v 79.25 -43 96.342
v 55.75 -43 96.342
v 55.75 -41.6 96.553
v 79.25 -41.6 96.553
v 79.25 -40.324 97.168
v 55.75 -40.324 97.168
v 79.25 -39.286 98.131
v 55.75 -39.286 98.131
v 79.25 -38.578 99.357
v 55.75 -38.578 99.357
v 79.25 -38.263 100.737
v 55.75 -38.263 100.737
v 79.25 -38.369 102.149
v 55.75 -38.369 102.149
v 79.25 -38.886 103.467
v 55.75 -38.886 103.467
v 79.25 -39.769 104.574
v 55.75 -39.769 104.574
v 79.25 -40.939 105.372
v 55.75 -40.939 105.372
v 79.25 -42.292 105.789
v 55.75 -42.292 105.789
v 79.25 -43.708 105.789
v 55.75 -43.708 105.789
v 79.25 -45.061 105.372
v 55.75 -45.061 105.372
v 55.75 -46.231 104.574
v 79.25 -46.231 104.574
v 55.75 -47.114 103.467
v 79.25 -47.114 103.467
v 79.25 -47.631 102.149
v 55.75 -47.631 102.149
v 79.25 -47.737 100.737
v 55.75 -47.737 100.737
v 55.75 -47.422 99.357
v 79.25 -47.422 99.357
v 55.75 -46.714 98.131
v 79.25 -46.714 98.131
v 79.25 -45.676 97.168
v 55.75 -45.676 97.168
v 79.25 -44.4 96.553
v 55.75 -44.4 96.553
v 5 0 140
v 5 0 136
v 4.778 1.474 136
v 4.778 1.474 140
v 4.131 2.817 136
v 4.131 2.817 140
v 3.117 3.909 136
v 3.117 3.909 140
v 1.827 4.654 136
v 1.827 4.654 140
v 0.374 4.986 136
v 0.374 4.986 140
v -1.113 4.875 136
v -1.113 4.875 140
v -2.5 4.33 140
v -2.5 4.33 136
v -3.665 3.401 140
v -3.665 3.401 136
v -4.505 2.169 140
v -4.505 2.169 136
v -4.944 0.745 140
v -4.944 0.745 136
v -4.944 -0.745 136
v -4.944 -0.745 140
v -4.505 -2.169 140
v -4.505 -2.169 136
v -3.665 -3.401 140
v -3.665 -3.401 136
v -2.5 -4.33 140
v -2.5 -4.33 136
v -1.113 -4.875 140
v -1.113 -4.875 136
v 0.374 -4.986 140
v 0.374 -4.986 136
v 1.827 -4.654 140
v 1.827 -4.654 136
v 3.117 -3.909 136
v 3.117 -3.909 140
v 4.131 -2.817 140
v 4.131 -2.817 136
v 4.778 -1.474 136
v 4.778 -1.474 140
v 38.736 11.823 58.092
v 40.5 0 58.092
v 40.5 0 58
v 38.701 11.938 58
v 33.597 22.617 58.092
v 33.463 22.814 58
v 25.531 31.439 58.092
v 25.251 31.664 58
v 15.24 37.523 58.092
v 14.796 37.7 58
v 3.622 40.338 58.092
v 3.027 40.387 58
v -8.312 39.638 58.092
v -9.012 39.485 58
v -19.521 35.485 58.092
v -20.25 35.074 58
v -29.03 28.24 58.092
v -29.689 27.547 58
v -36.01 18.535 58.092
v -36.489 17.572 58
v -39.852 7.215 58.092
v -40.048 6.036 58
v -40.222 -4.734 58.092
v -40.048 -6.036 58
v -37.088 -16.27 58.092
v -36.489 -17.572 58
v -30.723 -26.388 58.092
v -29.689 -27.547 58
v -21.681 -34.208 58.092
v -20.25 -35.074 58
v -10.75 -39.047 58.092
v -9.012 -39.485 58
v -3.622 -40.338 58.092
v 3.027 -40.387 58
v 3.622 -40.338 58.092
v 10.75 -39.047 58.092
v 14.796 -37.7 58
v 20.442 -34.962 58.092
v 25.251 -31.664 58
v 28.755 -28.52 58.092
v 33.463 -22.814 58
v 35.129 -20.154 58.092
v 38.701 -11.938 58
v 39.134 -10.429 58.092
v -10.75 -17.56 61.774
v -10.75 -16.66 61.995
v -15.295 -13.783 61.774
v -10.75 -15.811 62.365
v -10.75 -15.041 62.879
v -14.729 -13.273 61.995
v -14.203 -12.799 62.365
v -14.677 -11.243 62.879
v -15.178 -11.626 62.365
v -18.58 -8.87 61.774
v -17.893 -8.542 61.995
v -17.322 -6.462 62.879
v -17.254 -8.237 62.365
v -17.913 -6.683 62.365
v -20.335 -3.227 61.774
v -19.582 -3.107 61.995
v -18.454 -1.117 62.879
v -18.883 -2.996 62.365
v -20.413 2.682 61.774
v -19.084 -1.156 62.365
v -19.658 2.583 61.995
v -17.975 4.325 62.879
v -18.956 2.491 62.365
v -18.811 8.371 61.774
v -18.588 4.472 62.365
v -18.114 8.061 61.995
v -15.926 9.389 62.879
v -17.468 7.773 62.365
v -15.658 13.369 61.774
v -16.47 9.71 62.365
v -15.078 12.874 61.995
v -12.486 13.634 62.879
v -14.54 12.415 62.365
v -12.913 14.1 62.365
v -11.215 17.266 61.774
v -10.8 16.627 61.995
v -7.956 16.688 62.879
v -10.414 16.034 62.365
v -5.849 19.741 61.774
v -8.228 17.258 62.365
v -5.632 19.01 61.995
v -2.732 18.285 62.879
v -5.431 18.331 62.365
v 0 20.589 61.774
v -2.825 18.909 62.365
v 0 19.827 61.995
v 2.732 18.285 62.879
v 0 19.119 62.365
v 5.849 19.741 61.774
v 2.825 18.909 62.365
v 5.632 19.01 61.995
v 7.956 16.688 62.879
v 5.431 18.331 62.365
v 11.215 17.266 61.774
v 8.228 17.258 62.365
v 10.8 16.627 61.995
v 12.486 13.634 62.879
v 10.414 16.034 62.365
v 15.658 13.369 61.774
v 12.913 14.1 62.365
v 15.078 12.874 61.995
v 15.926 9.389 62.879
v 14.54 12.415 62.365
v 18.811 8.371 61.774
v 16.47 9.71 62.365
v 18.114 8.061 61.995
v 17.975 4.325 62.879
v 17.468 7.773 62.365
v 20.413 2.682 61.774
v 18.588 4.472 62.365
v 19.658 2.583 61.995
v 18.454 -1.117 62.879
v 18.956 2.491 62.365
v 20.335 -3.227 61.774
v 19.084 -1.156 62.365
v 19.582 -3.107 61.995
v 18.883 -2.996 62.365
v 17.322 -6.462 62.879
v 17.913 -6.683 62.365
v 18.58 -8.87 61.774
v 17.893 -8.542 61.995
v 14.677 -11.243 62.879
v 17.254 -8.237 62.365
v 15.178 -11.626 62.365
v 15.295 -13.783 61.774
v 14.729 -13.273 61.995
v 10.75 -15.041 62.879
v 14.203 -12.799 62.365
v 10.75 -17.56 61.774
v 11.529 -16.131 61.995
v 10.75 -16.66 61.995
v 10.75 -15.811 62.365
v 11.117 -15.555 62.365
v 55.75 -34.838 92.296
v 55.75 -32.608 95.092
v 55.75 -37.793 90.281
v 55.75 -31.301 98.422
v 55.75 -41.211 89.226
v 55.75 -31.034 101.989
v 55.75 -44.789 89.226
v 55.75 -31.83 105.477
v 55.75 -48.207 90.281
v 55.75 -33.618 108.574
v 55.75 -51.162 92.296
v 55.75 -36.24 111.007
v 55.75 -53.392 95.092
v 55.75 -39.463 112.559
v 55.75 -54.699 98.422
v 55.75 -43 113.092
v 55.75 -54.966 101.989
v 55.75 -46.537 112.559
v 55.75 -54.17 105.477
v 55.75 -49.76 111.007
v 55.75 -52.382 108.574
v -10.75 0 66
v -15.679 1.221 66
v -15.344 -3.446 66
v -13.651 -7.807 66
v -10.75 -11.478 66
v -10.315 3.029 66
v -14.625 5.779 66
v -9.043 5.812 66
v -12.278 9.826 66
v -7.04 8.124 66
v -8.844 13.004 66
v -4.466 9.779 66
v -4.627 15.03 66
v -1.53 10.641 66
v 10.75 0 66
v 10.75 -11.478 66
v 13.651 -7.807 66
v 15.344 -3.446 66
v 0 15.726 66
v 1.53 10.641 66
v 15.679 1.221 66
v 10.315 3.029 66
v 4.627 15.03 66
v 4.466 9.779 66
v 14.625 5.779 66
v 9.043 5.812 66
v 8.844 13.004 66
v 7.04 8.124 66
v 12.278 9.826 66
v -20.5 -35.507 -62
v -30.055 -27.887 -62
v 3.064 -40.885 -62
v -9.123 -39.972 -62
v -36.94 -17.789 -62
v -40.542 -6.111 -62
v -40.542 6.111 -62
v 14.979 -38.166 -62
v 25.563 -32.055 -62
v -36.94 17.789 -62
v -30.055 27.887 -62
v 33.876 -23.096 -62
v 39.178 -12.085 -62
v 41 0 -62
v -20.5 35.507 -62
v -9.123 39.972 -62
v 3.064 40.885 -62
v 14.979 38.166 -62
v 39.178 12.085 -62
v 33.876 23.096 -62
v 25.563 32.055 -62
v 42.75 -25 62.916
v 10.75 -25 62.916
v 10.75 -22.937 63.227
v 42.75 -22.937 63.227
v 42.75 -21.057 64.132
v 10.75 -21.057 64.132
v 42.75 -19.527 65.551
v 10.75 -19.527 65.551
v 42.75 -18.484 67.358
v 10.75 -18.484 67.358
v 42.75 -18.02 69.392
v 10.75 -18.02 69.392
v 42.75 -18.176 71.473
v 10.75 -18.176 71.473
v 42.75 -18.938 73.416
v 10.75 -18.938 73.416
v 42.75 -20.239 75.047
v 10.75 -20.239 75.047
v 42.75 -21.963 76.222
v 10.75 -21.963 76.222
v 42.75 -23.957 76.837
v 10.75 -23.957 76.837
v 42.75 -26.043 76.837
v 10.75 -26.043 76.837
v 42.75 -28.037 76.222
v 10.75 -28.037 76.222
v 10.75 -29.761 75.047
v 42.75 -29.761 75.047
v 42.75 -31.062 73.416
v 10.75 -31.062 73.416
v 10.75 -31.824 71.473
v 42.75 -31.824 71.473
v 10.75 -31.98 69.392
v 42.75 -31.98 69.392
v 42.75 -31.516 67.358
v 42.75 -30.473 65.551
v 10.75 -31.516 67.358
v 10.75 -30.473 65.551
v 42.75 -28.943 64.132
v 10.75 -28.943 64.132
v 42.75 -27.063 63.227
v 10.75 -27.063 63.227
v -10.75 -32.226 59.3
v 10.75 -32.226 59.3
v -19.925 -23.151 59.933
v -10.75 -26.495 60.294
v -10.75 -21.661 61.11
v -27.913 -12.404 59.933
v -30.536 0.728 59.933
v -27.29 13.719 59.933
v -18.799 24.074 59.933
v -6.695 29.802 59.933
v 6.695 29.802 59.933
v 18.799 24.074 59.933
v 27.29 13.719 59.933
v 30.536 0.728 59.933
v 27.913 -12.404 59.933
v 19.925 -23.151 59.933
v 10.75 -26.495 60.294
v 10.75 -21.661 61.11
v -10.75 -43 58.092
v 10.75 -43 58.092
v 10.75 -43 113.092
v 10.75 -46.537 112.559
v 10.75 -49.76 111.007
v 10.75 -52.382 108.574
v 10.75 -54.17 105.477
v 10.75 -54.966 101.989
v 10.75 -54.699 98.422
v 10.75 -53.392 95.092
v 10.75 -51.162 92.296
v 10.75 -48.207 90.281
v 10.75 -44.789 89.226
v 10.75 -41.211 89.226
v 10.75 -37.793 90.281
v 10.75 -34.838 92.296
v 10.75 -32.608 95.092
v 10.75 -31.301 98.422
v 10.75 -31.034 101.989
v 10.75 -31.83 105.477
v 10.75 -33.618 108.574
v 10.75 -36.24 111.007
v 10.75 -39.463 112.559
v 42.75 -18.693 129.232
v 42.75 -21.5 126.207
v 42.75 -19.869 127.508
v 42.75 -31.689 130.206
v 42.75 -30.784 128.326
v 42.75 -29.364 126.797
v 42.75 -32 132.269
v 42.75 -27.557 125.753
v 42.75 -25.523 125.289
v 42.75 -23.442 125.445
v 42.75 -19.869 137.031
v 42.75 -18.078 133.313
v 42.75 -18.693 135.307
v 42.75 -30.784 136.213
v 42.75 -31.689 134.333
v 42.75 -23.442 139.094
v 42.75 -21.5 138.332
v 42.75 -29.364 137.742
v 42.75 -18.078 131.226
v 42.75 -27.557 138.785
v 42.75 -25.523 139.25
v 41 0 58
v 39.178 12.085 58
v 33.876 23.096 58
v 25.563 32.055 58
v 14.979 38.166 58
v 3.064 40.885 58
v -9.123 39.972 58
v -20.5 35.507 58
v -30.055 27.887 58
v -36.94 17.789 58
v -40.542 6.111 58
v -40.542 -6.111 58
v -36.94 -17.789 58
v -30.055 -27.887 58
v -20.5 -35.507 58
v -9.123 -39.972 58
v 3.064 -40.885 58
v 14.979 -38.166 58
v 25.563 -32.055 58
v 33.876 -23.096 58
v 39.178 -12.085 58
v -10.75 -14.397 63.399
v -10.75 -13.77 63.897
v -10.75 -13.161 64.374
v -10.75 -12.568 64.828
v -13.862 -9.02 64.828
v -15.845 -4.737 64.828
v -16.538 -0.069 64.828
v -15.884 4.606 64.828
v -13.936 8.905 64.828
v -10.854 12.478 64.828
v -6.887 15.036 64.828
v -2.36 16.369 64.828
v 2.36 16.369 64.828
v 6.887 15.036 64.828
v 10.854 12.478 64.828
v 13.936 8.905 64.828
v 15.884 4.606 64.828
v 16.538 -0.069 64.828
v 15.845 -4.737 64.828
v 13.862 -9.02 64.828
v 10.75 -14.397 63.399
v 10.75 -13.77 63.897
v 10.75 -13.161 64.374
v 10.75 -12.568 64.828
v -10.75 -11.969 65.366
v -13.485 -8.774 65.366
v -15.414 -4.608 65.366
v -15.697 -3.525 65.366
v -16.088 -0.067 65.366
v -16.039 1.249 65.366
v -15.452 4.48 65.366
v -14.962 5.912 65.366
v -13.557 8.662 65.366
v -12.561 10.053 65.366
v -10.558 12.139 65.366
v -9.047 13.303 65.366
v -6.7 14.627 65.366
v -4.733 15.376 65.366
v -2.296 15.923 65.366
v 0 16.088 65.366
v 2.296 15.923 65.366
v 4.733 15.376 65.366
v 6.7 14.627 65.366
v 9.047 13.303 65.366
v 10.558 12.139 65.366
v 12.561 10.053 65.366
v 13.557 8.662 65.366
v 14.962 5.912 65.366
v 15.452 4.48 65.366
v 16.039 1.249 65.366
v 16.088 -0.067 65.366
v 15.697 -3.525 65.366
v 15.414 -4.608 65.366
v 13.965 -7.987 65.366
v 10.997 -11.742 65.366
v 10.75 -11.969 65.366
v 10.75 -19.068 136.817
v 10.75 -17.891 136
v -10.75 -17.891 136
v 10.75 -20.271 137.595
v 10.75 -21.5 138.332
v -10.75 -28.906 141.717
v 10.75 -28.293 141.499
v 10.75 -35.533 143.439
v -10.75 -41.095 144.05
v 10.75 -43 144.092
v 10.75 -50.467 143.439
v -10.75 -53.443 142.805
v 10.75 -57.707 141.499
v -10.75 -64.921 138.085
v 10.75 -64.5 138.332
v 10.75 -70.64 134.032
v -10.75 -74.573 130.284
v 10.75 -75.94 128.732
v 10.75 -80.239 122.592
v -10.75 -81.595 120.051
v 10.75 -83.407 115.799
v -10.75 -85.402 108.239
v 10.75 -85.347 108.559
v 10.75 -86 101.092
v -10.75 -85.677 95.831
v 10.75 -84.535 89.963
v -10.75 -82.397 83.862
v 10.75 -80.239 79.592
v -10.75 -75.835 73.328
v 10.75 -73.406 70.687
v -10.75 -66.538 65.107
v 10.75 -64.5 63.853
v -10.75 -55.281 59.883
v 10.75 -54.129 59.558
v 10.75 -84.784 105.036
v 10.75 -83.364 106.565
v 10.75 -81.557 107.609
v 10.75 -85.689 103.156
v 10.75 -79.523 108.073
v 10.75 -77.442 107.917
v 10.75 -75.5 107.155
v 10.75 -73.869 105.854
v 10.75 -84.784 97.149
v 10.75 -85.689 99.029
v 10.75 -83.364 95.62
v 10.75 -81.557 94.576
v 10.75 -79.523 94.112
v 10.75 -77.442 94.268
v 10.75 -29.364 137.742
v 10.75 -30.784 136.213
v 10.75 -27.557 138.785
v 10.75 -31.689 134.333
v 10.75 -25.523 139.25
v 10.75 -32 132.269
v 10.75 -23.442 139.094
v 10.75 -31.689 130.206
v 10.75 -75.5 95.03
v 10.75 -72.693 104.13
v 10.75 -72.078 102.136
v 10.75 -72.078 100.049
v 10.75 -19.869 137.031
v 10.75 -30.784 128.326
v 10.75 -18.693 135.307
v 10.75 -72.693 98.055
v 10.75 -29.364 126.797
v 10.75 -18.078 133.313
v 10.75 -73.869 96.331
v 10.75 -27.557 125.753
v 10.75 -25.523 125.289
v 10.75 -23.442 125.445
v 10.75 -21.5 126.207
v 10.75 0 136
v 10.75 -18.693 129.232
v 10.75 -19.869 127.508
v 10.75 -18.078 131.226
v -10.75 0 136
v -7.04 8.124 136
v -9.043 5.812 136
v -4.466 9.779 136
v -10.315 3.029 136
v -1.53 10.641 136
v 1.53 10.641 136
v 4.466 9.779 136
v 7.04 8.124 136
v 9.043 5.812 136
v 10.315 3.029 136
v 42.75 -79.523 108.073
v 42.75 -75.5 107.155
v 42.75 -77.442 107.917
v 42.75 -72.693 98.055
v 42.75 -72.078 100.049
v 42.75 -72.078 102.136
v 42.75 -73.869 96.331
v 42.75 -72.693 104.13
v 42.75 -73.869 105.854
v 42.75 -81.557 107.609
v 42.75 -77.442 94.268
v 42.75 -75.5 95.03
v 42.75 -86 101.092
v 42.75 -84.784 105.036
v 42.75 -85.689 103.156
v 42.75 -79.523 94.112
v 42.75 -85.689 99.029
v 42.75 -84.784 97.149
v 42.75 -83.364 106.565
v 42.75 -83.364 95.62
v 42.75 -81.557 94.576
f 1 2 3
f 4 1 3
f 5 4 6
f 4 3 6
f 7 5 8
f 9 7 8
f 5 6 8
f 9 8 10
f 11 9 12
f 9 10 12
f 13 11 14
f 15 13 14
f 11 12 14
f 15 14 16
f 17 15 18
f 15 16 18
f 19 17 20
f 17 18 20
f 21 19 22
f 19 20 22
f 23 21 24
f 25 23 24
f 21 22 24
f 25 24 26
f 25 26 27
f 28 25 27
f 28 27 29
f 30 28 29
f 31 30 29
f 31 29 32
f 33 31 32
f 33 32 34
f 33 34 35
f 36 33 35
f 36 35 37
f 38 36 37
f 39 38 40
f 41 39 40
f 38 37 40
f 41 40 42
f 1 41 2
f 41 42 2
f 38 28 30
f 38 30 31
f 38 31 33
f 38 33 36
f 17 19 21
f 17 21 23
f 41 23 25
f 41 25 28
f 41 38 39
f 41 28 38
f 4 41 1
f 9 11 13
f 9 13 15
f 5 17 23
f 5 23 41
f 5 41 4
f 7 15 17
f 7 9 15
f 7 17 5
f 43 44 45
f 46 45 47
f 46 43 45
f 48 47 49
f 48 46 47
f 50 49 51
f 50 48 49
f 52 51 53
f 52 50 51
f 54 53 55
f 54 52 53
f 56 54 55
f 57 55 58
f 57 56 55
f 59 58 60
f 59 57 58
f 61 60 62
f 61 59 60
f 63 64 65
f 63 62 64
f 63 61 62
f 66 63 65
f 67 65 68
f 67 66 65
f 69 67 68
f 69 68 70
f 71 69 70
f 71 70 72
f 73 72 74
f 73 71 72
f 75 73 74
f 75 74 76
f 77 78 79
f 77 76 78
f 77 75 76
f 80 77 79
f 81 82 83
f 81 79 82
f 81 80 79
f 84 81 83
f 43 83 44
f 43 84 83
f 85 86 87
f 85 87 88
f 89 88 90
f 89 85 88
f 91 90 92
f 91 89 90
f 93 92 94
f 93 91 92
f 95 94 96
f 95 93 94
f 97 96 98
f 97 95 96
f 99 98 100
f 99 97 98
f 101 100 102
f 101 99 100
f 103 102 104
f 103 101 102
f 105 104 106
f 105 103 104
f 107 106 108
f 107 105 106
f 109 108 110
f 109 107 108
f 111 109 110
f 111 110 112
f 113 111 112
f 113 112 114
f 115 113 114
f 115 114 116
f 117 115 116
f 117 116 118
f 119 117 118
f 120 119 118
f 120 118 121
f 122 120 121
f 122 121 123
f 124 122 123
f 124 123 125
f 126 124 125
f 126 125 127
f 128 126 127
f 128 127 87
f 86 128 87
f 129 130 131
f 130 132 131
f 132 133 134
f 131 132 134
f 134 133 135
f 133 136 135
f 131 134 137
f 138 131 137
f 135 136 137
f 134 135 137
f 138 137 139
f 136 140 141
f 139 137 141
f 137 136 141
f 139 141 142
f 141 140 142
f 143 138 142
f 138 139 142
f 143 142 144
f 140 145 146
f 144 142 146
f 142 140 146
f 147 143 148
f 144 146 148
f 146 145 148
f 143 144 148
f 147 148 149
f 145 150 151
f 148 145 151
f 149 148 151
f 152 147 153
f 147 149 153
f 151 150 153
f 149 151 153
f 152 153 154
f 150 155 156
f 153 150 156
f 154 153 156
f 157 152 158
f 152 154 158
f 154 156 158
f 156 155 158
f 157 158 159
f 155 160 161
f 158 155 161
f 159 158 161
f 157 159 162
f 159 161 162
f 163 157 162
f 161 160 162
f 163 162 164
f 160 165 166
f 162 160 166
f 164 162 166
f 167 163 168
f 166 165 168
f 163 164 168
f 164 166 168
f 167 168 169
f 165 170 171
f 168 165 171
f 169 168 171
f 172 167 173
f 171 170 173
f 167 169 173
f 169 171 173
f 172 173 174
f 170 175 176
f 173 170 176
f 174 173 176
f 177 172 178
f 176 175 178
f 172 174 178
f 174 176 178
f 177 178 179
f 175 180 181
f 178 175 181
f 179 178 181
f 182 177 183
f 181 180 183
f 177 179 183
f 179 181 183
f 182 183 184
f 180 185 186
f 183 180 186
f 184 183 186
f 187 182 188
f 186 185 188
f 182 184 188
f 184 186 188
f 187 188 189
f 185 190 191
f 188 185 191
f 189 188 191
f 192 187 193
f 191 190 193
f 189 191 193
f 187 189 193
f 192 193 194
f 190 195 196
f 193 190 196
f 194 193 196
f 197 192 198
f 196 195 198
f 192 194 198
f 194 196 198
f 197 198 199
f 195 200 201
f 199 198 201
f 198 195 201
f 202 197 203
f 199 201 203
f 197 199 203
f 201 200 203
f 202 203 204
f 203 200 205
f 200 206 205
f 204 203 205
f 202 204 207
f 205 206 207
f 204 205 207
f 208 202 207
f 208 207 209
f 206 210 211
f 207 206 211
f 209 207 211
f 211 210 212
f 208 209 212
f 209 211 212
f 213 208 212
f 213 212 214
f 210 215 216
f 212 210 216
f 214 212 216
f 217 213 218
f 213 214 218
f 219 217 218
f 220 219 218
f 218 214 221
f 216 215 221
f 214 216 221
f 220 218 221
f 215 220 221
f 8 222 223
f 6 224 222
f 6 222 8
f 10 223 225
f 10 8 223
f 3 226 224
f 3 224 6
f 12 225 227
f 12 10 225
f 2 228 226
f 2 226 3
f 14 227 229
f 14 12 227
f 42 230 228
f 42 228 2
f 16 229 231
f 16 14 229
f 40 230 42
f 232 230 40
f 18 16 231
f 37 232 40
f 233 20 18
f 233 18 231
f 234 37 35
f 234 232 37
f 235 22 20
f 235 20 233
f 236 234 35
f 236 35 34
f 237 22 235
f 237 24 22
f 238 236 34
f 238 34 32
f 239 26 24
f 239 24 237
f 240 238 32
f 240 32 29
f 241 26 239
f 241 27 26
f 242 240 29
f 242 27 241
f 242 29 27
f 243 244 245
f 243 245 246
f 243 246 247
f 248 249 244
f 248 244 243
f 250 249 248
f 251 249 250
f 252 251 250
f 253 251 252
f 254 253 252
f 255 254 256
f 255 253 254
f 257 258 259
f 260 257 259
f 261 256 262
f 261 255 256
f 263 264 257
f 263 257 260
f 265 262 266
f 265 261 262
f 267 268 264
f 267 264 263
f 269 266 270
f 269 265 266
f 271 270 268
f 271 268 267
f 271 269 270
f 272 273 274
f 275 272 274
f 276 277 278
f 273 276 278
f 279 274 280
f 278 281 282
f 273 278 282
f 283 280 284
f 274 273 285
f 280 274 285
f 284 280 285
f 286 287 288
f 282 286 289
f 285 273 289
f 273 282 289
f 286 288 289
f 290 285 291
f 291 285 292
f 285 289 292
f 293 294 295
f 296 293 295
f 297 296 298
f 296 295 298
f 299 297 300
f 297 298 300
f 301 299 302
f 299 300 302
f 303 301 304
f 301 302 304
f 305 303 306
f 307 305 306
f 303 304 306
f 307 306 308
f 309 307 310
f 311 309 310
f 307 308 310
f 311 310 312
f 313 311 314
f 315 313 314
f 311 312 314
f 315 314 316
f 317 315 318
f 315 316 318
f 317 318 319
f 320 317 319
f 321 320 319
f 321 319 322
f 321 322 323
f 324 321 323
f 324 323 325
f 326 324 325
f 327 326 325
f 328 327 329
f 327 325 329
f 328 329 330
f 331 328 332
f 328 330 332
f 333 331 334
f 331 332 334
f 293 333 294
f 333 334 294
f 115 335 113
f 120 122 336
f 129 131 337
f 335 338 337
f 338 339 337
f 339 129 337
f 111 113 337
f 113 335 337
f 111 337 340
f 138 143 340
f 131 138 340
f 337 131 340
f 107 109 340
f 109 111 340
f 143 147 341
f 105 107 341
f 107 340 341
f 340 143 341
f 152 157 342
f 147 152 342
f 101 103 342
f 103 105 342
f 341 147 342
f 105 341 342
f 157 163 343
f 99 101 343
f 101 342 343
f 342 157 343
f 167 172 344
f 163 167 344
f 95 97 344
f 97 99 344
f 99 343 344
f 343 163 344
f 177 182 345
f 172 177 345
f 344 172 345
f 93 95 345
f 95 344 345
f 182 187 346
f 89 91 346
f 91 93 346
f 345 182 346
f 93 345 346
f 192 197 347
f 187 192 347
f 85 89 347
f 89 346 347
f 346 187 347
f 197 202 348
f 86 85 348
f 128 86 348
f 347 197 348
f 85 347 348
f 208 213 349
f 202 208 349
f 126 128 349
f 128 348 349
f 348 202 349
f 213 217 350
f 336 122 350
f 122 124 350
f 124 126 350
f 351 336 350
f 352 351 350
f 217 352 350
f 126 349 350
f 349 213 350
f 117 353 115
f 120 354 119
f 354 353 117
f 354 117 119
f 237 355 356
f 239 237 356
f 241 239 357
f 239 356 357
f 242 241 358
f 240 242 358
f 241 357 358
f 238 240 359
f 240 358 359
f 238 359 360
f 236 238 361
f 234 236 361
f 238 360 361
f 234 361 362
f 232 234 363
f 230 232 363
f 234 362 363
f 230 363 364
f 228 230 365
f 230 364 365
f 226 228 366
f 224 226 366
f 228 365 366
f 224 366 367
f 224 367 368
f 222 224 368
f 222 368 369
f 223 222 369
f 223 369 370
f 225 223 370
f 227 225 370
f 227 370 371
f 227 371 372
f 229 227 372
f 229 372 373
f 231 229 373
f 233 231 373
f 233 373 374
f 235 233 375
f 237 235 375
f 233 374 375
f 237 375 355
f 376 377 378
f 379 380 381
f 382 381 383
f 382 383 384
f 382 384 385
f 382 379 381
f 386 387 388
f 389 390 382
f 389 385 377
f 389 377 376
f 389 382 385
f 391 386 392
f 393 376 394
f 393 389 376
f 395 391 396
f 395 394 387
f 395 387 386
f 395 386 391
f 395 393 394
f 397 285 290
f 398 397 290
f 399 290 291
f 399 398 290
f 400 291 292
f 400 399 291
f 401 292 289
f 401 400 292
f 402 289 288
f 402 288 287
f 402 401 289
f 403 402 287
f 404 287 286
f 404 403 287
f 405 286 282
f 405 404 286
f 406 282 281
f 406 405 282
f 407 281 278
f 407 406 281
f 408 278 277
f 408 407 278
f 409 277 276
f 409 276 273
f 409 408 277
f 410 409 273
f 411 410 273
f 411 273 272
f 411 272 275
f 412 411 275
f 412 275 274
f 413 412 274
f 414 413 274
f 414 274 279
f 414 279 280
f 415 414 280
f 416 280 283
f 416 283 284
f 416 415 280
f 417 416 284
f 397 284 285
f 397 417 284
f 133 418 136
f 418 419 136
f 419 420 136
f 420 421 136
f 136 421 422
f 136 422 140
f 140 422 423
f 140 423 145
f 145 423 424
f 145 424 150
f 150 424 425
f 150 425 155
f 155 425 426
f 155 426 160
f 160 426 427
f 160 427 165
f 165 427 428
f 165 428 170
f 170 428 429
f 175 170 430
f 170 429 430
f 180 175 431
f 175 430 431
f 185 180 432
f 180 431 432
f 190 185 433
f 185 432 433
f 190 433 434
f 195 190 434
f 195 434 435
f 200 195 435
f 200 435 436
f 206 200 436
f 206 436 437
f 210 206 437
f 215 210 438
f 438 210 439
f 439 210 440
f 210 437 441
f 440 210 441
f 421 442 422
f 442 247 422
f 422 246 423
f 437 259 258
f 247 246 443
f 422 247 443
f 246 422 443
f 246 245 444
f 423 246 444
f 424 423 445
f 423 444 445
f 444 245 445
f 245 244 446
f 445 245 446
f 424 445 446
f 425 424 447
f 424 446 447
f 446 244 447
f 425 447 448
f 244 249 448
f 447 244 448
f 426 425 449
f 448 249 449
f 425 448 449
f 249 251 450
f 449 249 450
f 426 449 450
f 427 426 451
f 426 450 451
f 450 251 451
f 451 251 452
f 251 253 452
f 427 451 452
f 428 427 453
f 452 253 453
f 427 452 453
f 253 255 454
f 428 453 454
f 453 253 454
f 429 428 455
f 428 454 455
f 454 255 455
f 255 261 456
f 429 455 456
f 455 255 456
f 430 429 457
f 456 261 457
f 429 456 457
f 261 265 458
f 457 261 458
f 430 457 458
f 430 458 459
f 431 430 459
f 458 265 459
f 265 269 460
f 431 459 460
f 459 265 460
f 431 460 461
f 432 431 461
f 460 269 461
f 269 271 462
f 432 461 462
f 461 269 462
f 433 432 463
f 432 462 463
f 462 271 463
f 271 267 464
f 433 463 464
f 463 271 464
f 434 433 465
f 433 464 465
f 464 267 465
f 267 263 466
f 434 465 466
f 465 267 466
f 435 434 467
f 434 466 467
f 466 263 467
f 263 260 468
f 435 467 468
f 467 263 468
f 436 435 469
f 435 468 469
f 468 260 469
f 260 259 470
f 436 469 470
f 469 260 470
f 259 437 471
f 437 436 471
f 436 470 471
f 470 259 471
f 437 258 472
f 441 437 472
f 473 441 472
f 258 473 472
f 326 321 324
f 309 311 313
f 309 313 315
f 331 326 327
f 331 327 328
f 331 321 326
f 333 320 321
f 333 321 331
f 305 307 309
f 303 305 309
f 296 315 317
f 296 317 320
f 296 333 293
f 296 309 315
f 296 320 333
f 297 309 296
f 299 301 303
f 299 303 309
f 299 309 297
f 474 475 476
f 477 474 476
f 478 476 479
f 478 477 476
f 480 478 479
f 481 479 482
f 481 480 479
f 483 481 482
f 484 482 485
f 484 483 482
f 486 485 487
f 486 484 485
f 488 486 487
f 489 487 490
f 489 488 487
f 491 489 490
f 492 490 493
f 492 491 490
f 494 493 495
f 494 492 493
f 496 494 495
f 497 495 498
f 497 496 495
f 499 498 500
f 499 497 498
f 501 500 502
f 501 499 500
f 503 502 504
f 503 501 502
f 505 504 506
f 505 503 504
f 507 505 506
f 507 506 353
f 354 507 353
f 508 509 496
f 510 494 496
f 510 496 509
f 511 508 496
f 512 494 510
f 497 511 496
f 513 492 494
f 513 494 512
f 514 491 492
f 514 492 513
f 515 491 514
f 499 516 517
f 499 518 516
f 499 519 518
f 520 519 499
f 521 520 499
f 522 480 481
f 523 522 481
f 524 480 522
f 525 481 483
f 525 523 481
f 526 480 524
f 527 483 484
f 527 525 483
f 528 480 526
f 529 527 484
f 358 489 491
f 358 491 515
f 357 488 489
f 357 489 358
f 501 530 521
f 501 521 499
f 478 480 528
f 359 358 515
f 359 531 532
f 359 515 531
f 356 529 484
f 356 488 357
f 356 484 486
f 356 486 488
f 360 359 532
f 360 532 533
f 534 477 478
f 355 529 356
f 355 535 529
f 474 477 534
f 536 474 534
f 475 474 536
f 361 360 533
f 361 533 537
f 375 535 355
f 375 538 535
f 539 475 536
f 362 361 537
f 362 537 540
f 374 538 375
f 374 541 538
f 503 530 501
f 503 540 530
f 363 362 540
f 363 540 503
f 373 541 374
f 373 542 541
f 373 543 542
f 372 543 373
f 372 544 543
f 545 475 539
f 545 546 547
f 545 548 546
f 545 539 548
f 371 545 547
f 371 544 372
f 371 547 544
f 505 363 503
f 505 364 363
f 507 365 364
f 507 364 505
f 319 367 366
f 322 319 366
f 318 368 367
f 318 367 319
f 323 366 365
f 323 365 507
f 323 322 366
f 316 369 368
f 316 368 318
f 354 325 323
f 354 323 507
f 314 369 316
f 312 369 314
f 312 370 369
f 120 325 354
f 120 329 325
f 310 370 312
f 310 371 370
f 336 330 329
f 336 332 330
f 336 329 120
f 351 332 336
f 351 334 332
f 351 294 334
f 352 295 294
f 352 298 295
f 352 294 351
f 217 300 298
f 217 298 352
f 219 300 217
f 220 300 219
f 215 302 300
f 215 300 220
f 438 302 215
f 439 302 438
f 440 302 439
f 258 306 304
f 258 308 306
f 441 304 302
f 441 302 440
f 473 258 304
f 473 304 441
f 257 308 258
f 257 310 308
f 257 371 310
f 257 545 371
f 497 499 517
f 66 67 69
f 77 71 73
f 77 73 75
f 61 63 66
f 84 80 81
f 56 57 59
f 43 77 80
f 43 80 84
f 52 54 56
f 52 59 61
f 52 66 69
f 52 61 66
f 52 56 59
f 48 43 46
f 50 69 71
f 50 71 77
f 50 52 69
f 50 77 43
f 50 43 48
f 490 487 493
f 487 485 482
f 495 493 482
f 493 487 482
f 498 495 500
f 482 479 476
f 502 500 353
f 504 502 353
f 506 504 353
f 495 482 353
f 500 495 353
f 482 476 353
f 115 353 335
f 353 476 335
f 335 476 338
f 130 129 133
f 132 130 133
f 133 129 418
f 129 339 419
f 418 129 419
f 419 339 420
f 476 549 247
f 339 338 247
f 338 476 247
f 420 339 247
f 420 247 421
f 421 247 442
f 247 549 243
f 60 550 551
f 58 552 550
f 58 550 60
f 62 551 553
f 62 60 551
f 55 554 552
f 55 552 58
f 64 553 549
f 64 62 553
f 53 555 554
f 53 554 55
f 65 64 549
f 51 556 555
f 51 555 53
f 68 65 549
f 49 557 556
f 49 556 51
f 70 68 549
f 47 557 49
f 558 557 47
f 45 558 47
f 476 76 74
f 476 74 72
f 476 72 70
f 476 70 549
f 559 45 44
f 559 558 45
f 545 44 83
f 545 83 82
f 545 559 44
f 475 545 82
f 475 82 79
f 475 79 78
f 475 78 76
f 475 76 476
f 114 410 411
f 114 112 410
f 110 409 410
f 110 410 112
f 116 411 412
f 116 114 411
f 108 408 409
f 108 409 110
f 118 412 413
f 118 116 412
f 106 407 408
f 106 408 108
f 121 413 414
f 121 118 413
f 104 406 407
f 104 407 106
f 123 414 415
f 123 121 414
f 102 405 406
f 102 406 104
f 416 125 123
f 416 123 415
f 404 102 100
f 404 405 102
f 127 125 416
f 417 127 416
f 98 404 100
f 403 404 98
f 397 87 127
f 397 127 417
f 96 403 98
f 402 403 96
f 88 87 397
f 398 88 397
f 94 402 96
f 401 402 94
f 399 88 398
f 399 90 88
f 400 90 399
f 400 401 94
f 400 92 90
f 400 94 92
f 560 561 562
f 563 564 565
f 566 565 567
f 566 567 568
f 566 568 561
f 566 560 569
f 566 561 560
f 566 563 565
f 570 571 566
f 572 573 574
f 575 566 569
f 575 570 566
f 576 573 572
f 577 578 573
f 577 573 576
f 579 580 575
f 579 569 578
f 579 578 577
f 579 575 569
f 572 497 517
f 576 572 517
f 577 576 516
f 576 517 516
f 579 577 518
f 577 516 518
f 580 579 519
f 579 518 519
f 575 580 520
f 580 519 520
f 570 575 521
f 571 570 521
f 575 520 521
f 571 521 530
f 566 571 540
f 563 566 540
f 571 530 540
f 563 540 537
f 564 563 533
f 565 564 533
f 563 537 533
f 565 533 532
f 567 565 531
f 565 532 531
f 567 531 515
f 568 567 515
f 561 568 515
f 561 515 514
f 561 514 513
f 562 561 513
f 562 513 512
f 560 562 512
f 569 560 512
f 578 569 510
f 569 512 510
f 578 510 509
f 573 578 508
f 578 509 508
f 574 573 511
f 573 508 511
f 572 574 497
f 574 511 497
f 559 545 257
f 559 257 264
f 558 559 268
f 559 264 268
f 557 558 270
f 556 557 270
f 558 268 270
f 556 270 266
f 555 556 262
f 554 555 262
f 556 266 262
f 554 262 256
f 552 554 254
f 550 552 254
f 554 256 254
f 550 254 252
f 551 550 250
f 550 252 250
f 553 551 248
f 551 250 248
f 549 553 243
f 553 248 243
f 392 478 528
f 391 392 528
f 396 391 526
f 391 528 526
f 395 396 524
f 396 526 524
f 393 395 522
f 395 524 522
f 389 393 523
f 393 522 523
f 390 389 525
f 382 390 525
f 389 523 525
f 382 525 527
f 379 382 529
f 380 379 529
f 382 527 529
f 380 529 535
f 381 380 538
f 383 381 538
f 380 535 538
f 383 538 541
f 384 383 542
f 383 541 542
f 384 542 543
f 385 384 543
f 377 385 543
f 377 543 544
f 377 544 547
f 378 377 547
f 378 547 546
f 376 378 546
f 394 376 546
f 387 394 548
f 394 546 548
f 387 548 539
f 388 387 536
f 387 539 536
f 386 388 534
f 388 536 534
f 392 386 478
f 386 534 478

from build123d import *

# Parameters (mm, degrees)
SKETCH1_R           = 41
BOSS_EXTRUDE1_DEPTH = 62
SKETCH2_R           = 41
BOSS_EXTRUDE2_DEPTH = 4
SKETCH3_R           = 41
SKETCH3_R_2         = 40.5
CUT_EXTRUDE1_DEPTH  = 8
SKETCH5_R           = 10.75
BOSS_EXTRUDE3_DEPTH = 70
SKETCH6_R           = 5
BOSS_EXTRUDE4_DEPTH = 4
BOSS_EXTRUDE5_DEPTH = 10.75
SKETCH8_R           = 7
BOSS_EXTRUDE6_DEPTH = 32
SKETCH9_R           = 12
BOSS_EXTRUDE7_DEPTH = 45
SKETCH10_R          = 4.75
BOSS_EXTRUDE8_DEPTH = 23.5


with BuildPart() as part:
    # Sketch1 → Boss-Extrude1 (new, symmetric)
    with BuildSketch(Plane.XY):
        Circle(SKETCH1_R)
    extrude(amount=BOSS_EXTRUDE1_DEPTH, both=True)

    # Sketch2 → Boss-Extrude2 (add, symmetric)
    with BuildSketch(Plane.XY.offset(62)):
        Circle(SKETCH2_R)
    extrude(amount=BOSS_EXTRUDE2_DEPTH, both=True)

    # Sketch3 → Cut-Extrude1 (cut)
    with BuildSketch(Plane.XY.offset(66)):
        Circle(SKETCH3_R)
        Circle(SKETCH3_R_2, mode=Mode.SUBTRACT)
    extrude(amount=-CUT_EXTRUDE1_DEPTH, mode=Mode.SUBTRACT)

    # Sketch4 → Cut-Revolve1 (revolve, cut)
    with BuildSketch(Plane(origin=(0, 0, 0), x_dir=(0, 0, -1), z_dir=(1, 0, 0)), mode=Mode.PRIVATE) as cut_revolve1_sk:
        with BuildLine():
            Line((-58, 41), (-61.774006584, 20.588938621))
            ThreePointArc((-61.774006584, 20.588938621), (-62.166989532, 19.454504548), (-62.878908123, 18.487784224))
            Line((-62.878908123, 18.487784224), (-64.828427125, 16.538265222))
            ThreePointArc((-64.828427125, 16.538265222), (-66.12612052, 15.671174217), (-67.656854249, 15.366692347))
            Line((-67.656854249, 15.366692347), (-68, 15.366692347))
            Line((-68, 15.366692347), (-68, 44))
            Line((-68, 44), (-58, 44))
            Line((-58, 44), (-58, 41))
        make_face()
    revolve(cut_revolve1_sk.sketch.rotate(Axis((0, 0, 0), (0, 0, -1)), 90), axis=Axis((0, 0, 0), (0, 0, -1)), mode=Mode.SUBTRACT)

    # Sketch5 → Boss-Extrude3 (add)
    with BuildSketch(Plane.XY.offset(66)):
        Circle(SKETCH5_R)
    extrude(amount=BOSS_EXTRUDE3_DEPTH)

    # Sketch6 → Boss-Extrude4 (add, symmetric)
    with BuildSketch(Plane.XY.offset(136)):
        Circle(SKETCH6_R)
    extrude(amount=BOSS_EXTRUDE4_DEPTH, both=True)

    # Sketch7 → Boss-Extrude5 (add, symmetric)
    with BuildSketch(Plane(origin=(0, 0, 0), x_dir=(0, 0, -1), z_dir=(1, 0, 0))):
        with BuildLine():
            Line((-136, 0), (-136, -17.890978608))
            ThreePointArc((-136, -17.890978608), (-114.282888831, -83.926914424), (-58.092450033, -43))
            Line((-58.092450033, -43), (-58.092450033, 0))
            Line((-58.092450033, 0), (-136, 0))
        make_face()
    extrude(amount=BOSS_EXTRUDE5_DEPTH, both=True)

    # Sketch8 → Boss-Extrude6 (add)
    with BuildSketch(Plane(origin=(10.75, 0, 0), x_dir=(0, 0, -1), z_dir=(1, 0, 0))):
        with Locations((-69.915535496, -25)):
            Circle(SKETCH8_R)
        with Locations(Location((-101.092450033, -79, 0), (0, 0, 269.999665288))):
            Circle(SKETCH8_R)
        with Locations(Location((-132.269364569, -25, 0), (0, 0, 149.999665321))):
            Circle(SKETCH8_R)
    extrude(amount=BOSS_EXTRUDE6_DEPTH)

    # Sketch9 → Boss-Extrude7 (add)
    with BuildSketch(Plane(origin=(10.75, 0, 0), x_dir=(0, 0, -1), z_dir=(1, 0, 0))):
        with Locations(Location((-101.092450033, -43, 0), (0, 0, 180))):
            Circle(SKETCH9_R)
    extrude(amount=BOSS_EXTRUDE7_DEPTH)

    # Sketch10 → Boss-Extrude8 (add)
    with BuildSketch(Plane(origin=(55.75, 0, 0), x_dir=(0, 0, -1), z_dir=(1, 0, 0))):
        with Locations((-101.092450033, -43)):
            Circle(SKETCH10_R)
    extrude(amount=BOSS_EXTRUDE8_DEPTH)


solid = part.part
